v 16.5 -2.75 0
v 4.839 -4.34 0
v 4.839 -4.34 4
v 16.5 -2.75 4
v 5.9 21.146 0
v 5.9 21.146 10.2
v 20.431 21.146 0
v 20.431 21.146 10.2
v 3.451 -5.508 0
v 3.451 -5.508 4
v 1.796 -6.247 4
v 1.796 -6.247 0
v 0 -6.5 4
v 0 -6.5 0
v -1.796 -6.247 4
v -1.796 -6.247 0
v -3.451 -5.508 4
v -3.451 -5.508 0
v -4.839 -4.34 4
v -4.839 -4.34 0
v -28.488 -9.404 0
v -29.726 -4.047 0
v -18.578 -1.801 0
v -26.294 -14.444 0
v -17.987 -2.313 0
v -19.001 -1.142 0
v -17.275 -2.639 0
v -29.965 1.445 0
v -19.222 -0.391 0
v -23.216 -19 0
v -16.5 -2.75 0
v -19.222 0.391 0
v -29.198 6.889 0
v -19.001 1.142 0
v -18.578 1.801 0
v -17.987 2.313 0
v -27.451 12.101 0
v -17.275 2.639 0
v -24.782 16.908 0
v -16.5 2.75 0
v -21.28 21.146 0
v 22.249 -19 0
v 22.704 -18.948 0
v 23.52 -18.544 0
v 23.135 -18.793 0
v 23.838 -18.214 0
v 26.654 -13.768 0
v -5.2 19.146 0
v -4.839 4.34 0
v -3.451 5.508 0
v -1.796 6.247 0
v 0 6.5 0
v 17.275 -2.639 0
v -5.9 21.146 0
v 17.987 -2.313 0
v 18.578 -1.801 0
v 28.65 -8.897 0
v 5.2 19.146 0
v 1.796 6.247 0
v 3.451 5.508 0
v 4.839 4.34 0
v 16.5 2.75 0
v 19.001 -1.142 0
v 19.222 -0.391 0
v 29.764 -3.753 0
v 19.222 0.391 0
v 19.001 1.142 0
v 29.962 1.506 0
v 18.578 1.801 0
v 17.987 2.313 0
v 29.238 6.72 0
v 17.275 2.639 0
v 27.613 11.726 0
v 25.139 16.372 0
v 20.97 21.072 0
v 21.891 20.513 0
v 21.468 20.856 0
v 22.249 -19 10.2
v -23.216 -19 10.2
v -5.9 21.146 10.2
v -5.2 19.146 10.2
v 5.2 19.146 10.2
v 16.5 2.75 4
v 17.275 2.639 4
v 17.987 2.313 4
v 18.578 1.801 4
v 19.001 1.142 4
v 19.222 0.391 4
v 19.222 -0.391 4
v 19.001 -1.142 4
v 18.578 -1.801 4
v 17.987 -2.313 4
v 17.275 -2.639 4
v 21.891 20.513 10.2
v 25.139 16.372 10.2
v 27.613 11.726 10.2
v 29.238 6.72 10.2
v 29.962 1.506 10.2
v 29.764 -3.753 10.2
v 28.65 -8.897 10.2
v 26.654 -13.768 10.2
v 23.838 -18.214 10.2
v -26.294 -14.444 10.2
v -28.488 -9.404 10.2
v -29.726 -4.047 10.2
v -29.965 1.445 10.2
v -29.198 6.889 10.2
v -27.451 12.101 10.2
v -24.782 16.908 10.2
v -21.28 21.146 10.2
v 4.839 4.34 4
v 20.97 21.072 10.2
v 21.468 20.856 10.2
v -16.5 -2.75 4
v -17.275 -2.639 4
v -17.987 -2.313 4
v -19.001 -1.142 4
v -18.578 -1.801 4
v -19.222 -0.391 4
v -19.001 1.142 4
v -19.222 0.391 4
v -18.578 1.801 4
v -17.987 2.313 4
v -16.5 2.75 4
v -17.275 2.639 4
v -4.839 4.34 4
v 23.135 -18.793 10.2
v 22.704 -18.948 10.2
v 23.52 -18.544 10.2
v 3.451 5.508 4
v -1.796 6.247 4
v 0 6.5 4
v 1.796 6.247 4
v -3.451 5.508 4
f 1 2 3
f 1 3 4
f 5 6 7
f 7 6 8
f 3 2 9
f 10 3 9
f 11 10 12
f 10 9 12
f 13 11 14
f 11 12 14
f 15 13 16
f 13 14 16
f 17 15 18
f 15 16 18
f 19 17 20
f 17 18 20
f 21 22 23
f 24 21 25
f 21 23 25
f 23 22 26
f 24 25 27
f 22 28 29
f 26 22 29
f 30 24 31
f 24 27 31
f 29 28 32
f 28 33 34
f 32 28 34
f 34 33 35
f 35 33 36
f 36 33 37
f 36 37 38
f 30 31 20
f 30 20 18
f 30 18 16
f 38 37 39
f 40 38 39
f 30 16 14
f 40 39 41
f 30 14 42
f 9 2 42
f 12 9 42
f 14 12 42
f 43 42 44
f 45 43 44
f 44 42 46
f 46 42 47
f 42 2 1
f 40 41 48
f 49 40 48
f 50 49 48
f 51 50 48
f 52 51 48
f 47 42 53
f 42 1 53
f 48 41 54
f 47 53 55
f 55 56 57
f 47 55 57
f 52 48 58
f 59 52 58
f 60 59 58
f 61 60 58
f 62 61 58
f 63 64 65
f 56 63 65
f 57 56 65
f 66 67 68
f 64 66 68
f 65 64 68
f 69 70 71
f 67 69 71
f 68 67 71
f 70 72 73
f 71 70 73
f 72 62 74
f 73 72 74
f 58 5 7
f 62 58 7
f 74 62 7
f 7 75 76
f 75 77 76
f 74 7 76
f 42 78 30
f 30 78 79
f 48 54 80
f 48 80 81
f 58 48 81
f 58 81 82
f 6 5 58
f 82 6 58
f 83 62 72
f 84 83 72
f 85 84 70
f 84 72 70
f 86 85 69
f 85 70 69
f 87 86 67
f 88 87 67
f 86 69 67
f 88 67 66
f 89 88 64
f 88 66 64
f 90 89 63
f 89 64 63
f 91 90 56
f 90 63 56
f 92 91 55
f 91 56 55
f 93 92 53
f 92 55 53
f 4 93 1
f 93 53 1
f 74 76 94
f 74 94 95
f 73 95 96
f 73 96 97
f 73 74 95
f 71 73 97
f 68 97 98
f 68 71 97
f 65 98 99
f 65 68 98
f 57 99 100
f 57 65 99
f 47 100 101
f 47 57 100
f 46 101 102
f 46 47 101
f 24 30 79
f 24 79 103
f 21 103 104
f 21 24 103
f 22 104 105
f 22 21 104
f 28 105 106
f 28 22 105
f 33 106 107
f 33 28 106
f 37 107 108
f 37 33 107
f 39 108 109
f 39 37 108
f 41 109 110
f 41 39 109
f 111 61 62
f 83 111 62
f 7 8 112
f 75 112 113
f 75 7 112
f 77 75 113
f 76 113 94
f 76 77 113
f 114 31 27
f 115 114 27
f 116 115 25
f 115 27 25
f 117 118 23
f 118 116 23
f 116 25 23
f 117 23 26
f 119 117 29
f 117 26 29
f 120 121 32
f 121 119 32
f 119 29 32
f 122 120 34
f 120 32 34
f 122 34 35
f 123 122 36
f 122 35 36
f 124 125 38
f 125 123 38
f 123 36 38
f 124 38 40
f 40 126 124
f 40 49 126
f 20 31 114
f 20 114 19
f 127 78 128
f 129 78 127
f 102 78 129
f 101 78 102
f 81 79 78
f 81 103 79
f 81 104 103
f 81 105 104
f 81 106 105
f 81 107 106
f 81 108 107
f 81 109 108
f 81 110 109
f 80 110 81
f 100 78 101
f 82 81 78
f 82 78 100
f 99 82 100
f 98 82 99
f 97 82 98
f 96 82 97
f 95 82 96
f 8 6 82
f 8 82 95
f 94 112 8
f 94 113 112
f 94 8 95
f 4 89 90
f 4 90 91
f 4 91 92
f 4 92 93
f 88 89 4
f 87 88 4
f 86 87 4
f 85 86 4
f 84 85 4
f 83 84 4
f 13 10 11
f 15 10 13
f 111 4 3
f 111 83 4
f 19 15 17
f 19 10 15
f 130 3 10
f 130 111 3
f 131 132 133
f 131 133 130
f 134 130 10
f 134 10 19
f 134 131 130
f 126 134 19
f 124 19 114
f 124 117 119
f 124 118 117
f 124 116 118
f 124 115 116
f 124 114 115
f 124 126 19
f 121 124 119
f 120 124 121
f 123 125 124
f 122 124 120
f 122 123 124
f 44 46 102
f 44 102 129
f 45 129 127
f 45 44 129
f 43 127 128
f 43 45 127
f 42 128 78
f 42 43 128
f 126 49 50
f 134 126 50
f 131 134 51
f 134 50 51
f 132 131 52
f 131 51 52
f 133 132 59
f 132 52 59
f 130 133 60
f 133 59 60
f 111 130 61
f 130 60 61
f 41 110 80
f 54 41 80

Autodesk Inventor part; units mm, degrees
ref_plane "YZ Plane" through (0, 0, 0) normal (1, 0, 0) x (0, 1, 0)
ref_plane "XZ Plane" through (0, 0, 0) normal (0, 1, 0) x (-1, 0, 0)
ref_plane "XY Plane" through (0, 0, 0) normal (0, 0, 1) x (1, 0, 0)
sketch "Эскиз5" plane through (0, 0, 0) normal (0, 0, 1) x (1, 0, 0)
  circle A0 centre (0, 0) radius 30
  line L0 (0, 30) -> (-5.2, 30)
  line L1 (-5.2, 30) -> (-5.2, 29.5459)
  line L2 (-5.2, 29.5459) -> (-5.2, 19.1459)
  line L3 (-5.2, 19.1459) -> (5.2, 19.1459)
  line L4 (5.2, 19.1459) -> (5.2, 29.5459)
  dimension "d17" = 60
  dimension "d18" = 5.2
  dimension "d19" = 10.4
  dimension "d20" = 10.4
extrude "Выдавливание3" add sketch "Эскиз5" along normal blind 10.2 contours A0 L2 L3 L4 picked at (-1.0099, 2.8151)
sketch "Эскиз7" plane through (0, 0, 10.2) normal (0, 0, 1) x (1, 0, 0)
  line L0 (5.2, 19.1459) -> (-5.2, 19.1459) projected
  line L1 (-5.2, 19.1459) -> (-5.2, 21.1459)
  line L2 (-5.2, 21.1459) -> (21.2803, 21.1459)
  arc A0 (-5.2, 29.5459) -> (5.2, 29.5459) centre (0, 0) ccw projected
  line L3 (-5.2, 21.1459) -> (-21.3192, 21.1459)
  line L4 (-5.2, 19.1459) -> (-5.2, 29.5459) projected
  circle A1 centre (0, 0) radius 30
  point P0 (-21.2803, 21.1459)
  point P1 (5.2, 29.5459)
  dimension "d26" = 2
extrude "Выдавливание5" cut sketch "Эскиз7" against normal blind 11 contours L4 A1 A0 L2 | L3 A0 L4
sketch "Эскиз8" plane through (0, 0, 10.2) normal (0, 0, 1) x (1, 0, 0)
  line L0 (-5.2, 21.1459) -> (-21.2803, 21.1459) projected
  line L1 (-5.2, 21.1459) -> (-5.9, 21.1459)
  line L2 (-5.2, 19.1459) -> (-5.2, 21.1459) projected
  line L3 (-5.9, 21.1459) -> (-5.2, 19.1459)
  line L4 (5.2, 21.1459) -> (5.2, 19.1459) projected
  line L5 (-5.2, 19.1459) -> (5.2, 19.1459)
  line L6 (5.2, 19.1459) -> (5.2, 21.1459)
  line L7 (5.2, 21.1459) -> (5.9, 21.1459)
  line L8 (21.2803, 21.1459) -> (5.2, 21.1459) projected
  line L9 (5.9, 21.1459) -> (5.2, 19.1459)
  point P0 (0, 0)
  dimension "d29" = 0.7
  dimension "d30" = 0.7
extrude "Выдавливание6" cut sketch "Эскиз8" against normal blind 11
sketch "Эскиз9" plane through (0, 0, 10.2) normal (0, 0, 1) x (1, 0, 0)
  line L0 (0, 0) -> (0, -19)
  line L1 (0, -19) -> (23.2164, -19)
  arc A0 (-21.2803, 21.1459) -> (21.2803, 21.1459) centre (0, 0) ccw projected
  line L2 (0, -19) -> (-23.2164, -19)
  circle A1 centre (0, 0) radius 30
  dimension "d33" = 19
extrude "Выдавливание7" cut sketch "Эскиз9" against normal blind 11 contours L1 A0 L2
fillet "Сопряжение1" radius 2 2 edges at (23.2164, -19, 5.1) (21.2803, 21.1459, 5.1)
sketch "Эскиз10" plane through (0, 0, 0) normal (0, 0, -1) x (-1, 0, 0)
  circle A0 centre (0, 0) radius 6.5
  circle A1 centre (0, 0) radius 5
  line L0 (0, 0) -> (19, 0)
  line L1 (19, 0) -> (-19, 0)
  line L2 (-19, 0) -> (-16.5, 0)
  line L3 (19, 0) -> (16.5, 0)
  circle A2 centre (-16.5, 0) radius 2.75
  circle A3 centre (16.5, 0) radius 2.75
  line L4 (0, 5) -> (-16.5, 2.75)
  line L5 (0, 5) -> (16.5, 2.75)
  line L6 (16.5, -2.75) -> (0, -5)
  line L7 (0, -5) -> (-16.5, -2.75)
  point P0 (-4.8387, -4.3402)
  point P1 (4.8387, -4.3402)
  point P2 (4.8387, 4.3402)
  point P3 (-4.8387, 4.3402)
  dimension "d39" = 13
  dimension "d40" = 10
  dimension "d41" = 19
  dimension "d42" = 38
  dimension "d43" = 2.5
  dimension "d44" = 2.5
  dimension "d45" = 5.5
  dimension "d46" = 5.5
extrude "Выдавливание8" cut sketch "Эскиз10" against normal blind 4
sketch "Эскиз12" plane through (0, 0, 0) normal (0, 0, -1) x (-1, 0, 0)
  point P0 (0, 0)
sketch "Эскиз13" plane through (0, 0, 4) normal (0, 0, -1) x (-1, 0, 0)
  line L0 (-5.2, 19.1459) -> (5.2, 19.1459) projected
  point P0 (0, 0)
  dimension "d49" = 19.1459
properties part number "vydacha_disk"
